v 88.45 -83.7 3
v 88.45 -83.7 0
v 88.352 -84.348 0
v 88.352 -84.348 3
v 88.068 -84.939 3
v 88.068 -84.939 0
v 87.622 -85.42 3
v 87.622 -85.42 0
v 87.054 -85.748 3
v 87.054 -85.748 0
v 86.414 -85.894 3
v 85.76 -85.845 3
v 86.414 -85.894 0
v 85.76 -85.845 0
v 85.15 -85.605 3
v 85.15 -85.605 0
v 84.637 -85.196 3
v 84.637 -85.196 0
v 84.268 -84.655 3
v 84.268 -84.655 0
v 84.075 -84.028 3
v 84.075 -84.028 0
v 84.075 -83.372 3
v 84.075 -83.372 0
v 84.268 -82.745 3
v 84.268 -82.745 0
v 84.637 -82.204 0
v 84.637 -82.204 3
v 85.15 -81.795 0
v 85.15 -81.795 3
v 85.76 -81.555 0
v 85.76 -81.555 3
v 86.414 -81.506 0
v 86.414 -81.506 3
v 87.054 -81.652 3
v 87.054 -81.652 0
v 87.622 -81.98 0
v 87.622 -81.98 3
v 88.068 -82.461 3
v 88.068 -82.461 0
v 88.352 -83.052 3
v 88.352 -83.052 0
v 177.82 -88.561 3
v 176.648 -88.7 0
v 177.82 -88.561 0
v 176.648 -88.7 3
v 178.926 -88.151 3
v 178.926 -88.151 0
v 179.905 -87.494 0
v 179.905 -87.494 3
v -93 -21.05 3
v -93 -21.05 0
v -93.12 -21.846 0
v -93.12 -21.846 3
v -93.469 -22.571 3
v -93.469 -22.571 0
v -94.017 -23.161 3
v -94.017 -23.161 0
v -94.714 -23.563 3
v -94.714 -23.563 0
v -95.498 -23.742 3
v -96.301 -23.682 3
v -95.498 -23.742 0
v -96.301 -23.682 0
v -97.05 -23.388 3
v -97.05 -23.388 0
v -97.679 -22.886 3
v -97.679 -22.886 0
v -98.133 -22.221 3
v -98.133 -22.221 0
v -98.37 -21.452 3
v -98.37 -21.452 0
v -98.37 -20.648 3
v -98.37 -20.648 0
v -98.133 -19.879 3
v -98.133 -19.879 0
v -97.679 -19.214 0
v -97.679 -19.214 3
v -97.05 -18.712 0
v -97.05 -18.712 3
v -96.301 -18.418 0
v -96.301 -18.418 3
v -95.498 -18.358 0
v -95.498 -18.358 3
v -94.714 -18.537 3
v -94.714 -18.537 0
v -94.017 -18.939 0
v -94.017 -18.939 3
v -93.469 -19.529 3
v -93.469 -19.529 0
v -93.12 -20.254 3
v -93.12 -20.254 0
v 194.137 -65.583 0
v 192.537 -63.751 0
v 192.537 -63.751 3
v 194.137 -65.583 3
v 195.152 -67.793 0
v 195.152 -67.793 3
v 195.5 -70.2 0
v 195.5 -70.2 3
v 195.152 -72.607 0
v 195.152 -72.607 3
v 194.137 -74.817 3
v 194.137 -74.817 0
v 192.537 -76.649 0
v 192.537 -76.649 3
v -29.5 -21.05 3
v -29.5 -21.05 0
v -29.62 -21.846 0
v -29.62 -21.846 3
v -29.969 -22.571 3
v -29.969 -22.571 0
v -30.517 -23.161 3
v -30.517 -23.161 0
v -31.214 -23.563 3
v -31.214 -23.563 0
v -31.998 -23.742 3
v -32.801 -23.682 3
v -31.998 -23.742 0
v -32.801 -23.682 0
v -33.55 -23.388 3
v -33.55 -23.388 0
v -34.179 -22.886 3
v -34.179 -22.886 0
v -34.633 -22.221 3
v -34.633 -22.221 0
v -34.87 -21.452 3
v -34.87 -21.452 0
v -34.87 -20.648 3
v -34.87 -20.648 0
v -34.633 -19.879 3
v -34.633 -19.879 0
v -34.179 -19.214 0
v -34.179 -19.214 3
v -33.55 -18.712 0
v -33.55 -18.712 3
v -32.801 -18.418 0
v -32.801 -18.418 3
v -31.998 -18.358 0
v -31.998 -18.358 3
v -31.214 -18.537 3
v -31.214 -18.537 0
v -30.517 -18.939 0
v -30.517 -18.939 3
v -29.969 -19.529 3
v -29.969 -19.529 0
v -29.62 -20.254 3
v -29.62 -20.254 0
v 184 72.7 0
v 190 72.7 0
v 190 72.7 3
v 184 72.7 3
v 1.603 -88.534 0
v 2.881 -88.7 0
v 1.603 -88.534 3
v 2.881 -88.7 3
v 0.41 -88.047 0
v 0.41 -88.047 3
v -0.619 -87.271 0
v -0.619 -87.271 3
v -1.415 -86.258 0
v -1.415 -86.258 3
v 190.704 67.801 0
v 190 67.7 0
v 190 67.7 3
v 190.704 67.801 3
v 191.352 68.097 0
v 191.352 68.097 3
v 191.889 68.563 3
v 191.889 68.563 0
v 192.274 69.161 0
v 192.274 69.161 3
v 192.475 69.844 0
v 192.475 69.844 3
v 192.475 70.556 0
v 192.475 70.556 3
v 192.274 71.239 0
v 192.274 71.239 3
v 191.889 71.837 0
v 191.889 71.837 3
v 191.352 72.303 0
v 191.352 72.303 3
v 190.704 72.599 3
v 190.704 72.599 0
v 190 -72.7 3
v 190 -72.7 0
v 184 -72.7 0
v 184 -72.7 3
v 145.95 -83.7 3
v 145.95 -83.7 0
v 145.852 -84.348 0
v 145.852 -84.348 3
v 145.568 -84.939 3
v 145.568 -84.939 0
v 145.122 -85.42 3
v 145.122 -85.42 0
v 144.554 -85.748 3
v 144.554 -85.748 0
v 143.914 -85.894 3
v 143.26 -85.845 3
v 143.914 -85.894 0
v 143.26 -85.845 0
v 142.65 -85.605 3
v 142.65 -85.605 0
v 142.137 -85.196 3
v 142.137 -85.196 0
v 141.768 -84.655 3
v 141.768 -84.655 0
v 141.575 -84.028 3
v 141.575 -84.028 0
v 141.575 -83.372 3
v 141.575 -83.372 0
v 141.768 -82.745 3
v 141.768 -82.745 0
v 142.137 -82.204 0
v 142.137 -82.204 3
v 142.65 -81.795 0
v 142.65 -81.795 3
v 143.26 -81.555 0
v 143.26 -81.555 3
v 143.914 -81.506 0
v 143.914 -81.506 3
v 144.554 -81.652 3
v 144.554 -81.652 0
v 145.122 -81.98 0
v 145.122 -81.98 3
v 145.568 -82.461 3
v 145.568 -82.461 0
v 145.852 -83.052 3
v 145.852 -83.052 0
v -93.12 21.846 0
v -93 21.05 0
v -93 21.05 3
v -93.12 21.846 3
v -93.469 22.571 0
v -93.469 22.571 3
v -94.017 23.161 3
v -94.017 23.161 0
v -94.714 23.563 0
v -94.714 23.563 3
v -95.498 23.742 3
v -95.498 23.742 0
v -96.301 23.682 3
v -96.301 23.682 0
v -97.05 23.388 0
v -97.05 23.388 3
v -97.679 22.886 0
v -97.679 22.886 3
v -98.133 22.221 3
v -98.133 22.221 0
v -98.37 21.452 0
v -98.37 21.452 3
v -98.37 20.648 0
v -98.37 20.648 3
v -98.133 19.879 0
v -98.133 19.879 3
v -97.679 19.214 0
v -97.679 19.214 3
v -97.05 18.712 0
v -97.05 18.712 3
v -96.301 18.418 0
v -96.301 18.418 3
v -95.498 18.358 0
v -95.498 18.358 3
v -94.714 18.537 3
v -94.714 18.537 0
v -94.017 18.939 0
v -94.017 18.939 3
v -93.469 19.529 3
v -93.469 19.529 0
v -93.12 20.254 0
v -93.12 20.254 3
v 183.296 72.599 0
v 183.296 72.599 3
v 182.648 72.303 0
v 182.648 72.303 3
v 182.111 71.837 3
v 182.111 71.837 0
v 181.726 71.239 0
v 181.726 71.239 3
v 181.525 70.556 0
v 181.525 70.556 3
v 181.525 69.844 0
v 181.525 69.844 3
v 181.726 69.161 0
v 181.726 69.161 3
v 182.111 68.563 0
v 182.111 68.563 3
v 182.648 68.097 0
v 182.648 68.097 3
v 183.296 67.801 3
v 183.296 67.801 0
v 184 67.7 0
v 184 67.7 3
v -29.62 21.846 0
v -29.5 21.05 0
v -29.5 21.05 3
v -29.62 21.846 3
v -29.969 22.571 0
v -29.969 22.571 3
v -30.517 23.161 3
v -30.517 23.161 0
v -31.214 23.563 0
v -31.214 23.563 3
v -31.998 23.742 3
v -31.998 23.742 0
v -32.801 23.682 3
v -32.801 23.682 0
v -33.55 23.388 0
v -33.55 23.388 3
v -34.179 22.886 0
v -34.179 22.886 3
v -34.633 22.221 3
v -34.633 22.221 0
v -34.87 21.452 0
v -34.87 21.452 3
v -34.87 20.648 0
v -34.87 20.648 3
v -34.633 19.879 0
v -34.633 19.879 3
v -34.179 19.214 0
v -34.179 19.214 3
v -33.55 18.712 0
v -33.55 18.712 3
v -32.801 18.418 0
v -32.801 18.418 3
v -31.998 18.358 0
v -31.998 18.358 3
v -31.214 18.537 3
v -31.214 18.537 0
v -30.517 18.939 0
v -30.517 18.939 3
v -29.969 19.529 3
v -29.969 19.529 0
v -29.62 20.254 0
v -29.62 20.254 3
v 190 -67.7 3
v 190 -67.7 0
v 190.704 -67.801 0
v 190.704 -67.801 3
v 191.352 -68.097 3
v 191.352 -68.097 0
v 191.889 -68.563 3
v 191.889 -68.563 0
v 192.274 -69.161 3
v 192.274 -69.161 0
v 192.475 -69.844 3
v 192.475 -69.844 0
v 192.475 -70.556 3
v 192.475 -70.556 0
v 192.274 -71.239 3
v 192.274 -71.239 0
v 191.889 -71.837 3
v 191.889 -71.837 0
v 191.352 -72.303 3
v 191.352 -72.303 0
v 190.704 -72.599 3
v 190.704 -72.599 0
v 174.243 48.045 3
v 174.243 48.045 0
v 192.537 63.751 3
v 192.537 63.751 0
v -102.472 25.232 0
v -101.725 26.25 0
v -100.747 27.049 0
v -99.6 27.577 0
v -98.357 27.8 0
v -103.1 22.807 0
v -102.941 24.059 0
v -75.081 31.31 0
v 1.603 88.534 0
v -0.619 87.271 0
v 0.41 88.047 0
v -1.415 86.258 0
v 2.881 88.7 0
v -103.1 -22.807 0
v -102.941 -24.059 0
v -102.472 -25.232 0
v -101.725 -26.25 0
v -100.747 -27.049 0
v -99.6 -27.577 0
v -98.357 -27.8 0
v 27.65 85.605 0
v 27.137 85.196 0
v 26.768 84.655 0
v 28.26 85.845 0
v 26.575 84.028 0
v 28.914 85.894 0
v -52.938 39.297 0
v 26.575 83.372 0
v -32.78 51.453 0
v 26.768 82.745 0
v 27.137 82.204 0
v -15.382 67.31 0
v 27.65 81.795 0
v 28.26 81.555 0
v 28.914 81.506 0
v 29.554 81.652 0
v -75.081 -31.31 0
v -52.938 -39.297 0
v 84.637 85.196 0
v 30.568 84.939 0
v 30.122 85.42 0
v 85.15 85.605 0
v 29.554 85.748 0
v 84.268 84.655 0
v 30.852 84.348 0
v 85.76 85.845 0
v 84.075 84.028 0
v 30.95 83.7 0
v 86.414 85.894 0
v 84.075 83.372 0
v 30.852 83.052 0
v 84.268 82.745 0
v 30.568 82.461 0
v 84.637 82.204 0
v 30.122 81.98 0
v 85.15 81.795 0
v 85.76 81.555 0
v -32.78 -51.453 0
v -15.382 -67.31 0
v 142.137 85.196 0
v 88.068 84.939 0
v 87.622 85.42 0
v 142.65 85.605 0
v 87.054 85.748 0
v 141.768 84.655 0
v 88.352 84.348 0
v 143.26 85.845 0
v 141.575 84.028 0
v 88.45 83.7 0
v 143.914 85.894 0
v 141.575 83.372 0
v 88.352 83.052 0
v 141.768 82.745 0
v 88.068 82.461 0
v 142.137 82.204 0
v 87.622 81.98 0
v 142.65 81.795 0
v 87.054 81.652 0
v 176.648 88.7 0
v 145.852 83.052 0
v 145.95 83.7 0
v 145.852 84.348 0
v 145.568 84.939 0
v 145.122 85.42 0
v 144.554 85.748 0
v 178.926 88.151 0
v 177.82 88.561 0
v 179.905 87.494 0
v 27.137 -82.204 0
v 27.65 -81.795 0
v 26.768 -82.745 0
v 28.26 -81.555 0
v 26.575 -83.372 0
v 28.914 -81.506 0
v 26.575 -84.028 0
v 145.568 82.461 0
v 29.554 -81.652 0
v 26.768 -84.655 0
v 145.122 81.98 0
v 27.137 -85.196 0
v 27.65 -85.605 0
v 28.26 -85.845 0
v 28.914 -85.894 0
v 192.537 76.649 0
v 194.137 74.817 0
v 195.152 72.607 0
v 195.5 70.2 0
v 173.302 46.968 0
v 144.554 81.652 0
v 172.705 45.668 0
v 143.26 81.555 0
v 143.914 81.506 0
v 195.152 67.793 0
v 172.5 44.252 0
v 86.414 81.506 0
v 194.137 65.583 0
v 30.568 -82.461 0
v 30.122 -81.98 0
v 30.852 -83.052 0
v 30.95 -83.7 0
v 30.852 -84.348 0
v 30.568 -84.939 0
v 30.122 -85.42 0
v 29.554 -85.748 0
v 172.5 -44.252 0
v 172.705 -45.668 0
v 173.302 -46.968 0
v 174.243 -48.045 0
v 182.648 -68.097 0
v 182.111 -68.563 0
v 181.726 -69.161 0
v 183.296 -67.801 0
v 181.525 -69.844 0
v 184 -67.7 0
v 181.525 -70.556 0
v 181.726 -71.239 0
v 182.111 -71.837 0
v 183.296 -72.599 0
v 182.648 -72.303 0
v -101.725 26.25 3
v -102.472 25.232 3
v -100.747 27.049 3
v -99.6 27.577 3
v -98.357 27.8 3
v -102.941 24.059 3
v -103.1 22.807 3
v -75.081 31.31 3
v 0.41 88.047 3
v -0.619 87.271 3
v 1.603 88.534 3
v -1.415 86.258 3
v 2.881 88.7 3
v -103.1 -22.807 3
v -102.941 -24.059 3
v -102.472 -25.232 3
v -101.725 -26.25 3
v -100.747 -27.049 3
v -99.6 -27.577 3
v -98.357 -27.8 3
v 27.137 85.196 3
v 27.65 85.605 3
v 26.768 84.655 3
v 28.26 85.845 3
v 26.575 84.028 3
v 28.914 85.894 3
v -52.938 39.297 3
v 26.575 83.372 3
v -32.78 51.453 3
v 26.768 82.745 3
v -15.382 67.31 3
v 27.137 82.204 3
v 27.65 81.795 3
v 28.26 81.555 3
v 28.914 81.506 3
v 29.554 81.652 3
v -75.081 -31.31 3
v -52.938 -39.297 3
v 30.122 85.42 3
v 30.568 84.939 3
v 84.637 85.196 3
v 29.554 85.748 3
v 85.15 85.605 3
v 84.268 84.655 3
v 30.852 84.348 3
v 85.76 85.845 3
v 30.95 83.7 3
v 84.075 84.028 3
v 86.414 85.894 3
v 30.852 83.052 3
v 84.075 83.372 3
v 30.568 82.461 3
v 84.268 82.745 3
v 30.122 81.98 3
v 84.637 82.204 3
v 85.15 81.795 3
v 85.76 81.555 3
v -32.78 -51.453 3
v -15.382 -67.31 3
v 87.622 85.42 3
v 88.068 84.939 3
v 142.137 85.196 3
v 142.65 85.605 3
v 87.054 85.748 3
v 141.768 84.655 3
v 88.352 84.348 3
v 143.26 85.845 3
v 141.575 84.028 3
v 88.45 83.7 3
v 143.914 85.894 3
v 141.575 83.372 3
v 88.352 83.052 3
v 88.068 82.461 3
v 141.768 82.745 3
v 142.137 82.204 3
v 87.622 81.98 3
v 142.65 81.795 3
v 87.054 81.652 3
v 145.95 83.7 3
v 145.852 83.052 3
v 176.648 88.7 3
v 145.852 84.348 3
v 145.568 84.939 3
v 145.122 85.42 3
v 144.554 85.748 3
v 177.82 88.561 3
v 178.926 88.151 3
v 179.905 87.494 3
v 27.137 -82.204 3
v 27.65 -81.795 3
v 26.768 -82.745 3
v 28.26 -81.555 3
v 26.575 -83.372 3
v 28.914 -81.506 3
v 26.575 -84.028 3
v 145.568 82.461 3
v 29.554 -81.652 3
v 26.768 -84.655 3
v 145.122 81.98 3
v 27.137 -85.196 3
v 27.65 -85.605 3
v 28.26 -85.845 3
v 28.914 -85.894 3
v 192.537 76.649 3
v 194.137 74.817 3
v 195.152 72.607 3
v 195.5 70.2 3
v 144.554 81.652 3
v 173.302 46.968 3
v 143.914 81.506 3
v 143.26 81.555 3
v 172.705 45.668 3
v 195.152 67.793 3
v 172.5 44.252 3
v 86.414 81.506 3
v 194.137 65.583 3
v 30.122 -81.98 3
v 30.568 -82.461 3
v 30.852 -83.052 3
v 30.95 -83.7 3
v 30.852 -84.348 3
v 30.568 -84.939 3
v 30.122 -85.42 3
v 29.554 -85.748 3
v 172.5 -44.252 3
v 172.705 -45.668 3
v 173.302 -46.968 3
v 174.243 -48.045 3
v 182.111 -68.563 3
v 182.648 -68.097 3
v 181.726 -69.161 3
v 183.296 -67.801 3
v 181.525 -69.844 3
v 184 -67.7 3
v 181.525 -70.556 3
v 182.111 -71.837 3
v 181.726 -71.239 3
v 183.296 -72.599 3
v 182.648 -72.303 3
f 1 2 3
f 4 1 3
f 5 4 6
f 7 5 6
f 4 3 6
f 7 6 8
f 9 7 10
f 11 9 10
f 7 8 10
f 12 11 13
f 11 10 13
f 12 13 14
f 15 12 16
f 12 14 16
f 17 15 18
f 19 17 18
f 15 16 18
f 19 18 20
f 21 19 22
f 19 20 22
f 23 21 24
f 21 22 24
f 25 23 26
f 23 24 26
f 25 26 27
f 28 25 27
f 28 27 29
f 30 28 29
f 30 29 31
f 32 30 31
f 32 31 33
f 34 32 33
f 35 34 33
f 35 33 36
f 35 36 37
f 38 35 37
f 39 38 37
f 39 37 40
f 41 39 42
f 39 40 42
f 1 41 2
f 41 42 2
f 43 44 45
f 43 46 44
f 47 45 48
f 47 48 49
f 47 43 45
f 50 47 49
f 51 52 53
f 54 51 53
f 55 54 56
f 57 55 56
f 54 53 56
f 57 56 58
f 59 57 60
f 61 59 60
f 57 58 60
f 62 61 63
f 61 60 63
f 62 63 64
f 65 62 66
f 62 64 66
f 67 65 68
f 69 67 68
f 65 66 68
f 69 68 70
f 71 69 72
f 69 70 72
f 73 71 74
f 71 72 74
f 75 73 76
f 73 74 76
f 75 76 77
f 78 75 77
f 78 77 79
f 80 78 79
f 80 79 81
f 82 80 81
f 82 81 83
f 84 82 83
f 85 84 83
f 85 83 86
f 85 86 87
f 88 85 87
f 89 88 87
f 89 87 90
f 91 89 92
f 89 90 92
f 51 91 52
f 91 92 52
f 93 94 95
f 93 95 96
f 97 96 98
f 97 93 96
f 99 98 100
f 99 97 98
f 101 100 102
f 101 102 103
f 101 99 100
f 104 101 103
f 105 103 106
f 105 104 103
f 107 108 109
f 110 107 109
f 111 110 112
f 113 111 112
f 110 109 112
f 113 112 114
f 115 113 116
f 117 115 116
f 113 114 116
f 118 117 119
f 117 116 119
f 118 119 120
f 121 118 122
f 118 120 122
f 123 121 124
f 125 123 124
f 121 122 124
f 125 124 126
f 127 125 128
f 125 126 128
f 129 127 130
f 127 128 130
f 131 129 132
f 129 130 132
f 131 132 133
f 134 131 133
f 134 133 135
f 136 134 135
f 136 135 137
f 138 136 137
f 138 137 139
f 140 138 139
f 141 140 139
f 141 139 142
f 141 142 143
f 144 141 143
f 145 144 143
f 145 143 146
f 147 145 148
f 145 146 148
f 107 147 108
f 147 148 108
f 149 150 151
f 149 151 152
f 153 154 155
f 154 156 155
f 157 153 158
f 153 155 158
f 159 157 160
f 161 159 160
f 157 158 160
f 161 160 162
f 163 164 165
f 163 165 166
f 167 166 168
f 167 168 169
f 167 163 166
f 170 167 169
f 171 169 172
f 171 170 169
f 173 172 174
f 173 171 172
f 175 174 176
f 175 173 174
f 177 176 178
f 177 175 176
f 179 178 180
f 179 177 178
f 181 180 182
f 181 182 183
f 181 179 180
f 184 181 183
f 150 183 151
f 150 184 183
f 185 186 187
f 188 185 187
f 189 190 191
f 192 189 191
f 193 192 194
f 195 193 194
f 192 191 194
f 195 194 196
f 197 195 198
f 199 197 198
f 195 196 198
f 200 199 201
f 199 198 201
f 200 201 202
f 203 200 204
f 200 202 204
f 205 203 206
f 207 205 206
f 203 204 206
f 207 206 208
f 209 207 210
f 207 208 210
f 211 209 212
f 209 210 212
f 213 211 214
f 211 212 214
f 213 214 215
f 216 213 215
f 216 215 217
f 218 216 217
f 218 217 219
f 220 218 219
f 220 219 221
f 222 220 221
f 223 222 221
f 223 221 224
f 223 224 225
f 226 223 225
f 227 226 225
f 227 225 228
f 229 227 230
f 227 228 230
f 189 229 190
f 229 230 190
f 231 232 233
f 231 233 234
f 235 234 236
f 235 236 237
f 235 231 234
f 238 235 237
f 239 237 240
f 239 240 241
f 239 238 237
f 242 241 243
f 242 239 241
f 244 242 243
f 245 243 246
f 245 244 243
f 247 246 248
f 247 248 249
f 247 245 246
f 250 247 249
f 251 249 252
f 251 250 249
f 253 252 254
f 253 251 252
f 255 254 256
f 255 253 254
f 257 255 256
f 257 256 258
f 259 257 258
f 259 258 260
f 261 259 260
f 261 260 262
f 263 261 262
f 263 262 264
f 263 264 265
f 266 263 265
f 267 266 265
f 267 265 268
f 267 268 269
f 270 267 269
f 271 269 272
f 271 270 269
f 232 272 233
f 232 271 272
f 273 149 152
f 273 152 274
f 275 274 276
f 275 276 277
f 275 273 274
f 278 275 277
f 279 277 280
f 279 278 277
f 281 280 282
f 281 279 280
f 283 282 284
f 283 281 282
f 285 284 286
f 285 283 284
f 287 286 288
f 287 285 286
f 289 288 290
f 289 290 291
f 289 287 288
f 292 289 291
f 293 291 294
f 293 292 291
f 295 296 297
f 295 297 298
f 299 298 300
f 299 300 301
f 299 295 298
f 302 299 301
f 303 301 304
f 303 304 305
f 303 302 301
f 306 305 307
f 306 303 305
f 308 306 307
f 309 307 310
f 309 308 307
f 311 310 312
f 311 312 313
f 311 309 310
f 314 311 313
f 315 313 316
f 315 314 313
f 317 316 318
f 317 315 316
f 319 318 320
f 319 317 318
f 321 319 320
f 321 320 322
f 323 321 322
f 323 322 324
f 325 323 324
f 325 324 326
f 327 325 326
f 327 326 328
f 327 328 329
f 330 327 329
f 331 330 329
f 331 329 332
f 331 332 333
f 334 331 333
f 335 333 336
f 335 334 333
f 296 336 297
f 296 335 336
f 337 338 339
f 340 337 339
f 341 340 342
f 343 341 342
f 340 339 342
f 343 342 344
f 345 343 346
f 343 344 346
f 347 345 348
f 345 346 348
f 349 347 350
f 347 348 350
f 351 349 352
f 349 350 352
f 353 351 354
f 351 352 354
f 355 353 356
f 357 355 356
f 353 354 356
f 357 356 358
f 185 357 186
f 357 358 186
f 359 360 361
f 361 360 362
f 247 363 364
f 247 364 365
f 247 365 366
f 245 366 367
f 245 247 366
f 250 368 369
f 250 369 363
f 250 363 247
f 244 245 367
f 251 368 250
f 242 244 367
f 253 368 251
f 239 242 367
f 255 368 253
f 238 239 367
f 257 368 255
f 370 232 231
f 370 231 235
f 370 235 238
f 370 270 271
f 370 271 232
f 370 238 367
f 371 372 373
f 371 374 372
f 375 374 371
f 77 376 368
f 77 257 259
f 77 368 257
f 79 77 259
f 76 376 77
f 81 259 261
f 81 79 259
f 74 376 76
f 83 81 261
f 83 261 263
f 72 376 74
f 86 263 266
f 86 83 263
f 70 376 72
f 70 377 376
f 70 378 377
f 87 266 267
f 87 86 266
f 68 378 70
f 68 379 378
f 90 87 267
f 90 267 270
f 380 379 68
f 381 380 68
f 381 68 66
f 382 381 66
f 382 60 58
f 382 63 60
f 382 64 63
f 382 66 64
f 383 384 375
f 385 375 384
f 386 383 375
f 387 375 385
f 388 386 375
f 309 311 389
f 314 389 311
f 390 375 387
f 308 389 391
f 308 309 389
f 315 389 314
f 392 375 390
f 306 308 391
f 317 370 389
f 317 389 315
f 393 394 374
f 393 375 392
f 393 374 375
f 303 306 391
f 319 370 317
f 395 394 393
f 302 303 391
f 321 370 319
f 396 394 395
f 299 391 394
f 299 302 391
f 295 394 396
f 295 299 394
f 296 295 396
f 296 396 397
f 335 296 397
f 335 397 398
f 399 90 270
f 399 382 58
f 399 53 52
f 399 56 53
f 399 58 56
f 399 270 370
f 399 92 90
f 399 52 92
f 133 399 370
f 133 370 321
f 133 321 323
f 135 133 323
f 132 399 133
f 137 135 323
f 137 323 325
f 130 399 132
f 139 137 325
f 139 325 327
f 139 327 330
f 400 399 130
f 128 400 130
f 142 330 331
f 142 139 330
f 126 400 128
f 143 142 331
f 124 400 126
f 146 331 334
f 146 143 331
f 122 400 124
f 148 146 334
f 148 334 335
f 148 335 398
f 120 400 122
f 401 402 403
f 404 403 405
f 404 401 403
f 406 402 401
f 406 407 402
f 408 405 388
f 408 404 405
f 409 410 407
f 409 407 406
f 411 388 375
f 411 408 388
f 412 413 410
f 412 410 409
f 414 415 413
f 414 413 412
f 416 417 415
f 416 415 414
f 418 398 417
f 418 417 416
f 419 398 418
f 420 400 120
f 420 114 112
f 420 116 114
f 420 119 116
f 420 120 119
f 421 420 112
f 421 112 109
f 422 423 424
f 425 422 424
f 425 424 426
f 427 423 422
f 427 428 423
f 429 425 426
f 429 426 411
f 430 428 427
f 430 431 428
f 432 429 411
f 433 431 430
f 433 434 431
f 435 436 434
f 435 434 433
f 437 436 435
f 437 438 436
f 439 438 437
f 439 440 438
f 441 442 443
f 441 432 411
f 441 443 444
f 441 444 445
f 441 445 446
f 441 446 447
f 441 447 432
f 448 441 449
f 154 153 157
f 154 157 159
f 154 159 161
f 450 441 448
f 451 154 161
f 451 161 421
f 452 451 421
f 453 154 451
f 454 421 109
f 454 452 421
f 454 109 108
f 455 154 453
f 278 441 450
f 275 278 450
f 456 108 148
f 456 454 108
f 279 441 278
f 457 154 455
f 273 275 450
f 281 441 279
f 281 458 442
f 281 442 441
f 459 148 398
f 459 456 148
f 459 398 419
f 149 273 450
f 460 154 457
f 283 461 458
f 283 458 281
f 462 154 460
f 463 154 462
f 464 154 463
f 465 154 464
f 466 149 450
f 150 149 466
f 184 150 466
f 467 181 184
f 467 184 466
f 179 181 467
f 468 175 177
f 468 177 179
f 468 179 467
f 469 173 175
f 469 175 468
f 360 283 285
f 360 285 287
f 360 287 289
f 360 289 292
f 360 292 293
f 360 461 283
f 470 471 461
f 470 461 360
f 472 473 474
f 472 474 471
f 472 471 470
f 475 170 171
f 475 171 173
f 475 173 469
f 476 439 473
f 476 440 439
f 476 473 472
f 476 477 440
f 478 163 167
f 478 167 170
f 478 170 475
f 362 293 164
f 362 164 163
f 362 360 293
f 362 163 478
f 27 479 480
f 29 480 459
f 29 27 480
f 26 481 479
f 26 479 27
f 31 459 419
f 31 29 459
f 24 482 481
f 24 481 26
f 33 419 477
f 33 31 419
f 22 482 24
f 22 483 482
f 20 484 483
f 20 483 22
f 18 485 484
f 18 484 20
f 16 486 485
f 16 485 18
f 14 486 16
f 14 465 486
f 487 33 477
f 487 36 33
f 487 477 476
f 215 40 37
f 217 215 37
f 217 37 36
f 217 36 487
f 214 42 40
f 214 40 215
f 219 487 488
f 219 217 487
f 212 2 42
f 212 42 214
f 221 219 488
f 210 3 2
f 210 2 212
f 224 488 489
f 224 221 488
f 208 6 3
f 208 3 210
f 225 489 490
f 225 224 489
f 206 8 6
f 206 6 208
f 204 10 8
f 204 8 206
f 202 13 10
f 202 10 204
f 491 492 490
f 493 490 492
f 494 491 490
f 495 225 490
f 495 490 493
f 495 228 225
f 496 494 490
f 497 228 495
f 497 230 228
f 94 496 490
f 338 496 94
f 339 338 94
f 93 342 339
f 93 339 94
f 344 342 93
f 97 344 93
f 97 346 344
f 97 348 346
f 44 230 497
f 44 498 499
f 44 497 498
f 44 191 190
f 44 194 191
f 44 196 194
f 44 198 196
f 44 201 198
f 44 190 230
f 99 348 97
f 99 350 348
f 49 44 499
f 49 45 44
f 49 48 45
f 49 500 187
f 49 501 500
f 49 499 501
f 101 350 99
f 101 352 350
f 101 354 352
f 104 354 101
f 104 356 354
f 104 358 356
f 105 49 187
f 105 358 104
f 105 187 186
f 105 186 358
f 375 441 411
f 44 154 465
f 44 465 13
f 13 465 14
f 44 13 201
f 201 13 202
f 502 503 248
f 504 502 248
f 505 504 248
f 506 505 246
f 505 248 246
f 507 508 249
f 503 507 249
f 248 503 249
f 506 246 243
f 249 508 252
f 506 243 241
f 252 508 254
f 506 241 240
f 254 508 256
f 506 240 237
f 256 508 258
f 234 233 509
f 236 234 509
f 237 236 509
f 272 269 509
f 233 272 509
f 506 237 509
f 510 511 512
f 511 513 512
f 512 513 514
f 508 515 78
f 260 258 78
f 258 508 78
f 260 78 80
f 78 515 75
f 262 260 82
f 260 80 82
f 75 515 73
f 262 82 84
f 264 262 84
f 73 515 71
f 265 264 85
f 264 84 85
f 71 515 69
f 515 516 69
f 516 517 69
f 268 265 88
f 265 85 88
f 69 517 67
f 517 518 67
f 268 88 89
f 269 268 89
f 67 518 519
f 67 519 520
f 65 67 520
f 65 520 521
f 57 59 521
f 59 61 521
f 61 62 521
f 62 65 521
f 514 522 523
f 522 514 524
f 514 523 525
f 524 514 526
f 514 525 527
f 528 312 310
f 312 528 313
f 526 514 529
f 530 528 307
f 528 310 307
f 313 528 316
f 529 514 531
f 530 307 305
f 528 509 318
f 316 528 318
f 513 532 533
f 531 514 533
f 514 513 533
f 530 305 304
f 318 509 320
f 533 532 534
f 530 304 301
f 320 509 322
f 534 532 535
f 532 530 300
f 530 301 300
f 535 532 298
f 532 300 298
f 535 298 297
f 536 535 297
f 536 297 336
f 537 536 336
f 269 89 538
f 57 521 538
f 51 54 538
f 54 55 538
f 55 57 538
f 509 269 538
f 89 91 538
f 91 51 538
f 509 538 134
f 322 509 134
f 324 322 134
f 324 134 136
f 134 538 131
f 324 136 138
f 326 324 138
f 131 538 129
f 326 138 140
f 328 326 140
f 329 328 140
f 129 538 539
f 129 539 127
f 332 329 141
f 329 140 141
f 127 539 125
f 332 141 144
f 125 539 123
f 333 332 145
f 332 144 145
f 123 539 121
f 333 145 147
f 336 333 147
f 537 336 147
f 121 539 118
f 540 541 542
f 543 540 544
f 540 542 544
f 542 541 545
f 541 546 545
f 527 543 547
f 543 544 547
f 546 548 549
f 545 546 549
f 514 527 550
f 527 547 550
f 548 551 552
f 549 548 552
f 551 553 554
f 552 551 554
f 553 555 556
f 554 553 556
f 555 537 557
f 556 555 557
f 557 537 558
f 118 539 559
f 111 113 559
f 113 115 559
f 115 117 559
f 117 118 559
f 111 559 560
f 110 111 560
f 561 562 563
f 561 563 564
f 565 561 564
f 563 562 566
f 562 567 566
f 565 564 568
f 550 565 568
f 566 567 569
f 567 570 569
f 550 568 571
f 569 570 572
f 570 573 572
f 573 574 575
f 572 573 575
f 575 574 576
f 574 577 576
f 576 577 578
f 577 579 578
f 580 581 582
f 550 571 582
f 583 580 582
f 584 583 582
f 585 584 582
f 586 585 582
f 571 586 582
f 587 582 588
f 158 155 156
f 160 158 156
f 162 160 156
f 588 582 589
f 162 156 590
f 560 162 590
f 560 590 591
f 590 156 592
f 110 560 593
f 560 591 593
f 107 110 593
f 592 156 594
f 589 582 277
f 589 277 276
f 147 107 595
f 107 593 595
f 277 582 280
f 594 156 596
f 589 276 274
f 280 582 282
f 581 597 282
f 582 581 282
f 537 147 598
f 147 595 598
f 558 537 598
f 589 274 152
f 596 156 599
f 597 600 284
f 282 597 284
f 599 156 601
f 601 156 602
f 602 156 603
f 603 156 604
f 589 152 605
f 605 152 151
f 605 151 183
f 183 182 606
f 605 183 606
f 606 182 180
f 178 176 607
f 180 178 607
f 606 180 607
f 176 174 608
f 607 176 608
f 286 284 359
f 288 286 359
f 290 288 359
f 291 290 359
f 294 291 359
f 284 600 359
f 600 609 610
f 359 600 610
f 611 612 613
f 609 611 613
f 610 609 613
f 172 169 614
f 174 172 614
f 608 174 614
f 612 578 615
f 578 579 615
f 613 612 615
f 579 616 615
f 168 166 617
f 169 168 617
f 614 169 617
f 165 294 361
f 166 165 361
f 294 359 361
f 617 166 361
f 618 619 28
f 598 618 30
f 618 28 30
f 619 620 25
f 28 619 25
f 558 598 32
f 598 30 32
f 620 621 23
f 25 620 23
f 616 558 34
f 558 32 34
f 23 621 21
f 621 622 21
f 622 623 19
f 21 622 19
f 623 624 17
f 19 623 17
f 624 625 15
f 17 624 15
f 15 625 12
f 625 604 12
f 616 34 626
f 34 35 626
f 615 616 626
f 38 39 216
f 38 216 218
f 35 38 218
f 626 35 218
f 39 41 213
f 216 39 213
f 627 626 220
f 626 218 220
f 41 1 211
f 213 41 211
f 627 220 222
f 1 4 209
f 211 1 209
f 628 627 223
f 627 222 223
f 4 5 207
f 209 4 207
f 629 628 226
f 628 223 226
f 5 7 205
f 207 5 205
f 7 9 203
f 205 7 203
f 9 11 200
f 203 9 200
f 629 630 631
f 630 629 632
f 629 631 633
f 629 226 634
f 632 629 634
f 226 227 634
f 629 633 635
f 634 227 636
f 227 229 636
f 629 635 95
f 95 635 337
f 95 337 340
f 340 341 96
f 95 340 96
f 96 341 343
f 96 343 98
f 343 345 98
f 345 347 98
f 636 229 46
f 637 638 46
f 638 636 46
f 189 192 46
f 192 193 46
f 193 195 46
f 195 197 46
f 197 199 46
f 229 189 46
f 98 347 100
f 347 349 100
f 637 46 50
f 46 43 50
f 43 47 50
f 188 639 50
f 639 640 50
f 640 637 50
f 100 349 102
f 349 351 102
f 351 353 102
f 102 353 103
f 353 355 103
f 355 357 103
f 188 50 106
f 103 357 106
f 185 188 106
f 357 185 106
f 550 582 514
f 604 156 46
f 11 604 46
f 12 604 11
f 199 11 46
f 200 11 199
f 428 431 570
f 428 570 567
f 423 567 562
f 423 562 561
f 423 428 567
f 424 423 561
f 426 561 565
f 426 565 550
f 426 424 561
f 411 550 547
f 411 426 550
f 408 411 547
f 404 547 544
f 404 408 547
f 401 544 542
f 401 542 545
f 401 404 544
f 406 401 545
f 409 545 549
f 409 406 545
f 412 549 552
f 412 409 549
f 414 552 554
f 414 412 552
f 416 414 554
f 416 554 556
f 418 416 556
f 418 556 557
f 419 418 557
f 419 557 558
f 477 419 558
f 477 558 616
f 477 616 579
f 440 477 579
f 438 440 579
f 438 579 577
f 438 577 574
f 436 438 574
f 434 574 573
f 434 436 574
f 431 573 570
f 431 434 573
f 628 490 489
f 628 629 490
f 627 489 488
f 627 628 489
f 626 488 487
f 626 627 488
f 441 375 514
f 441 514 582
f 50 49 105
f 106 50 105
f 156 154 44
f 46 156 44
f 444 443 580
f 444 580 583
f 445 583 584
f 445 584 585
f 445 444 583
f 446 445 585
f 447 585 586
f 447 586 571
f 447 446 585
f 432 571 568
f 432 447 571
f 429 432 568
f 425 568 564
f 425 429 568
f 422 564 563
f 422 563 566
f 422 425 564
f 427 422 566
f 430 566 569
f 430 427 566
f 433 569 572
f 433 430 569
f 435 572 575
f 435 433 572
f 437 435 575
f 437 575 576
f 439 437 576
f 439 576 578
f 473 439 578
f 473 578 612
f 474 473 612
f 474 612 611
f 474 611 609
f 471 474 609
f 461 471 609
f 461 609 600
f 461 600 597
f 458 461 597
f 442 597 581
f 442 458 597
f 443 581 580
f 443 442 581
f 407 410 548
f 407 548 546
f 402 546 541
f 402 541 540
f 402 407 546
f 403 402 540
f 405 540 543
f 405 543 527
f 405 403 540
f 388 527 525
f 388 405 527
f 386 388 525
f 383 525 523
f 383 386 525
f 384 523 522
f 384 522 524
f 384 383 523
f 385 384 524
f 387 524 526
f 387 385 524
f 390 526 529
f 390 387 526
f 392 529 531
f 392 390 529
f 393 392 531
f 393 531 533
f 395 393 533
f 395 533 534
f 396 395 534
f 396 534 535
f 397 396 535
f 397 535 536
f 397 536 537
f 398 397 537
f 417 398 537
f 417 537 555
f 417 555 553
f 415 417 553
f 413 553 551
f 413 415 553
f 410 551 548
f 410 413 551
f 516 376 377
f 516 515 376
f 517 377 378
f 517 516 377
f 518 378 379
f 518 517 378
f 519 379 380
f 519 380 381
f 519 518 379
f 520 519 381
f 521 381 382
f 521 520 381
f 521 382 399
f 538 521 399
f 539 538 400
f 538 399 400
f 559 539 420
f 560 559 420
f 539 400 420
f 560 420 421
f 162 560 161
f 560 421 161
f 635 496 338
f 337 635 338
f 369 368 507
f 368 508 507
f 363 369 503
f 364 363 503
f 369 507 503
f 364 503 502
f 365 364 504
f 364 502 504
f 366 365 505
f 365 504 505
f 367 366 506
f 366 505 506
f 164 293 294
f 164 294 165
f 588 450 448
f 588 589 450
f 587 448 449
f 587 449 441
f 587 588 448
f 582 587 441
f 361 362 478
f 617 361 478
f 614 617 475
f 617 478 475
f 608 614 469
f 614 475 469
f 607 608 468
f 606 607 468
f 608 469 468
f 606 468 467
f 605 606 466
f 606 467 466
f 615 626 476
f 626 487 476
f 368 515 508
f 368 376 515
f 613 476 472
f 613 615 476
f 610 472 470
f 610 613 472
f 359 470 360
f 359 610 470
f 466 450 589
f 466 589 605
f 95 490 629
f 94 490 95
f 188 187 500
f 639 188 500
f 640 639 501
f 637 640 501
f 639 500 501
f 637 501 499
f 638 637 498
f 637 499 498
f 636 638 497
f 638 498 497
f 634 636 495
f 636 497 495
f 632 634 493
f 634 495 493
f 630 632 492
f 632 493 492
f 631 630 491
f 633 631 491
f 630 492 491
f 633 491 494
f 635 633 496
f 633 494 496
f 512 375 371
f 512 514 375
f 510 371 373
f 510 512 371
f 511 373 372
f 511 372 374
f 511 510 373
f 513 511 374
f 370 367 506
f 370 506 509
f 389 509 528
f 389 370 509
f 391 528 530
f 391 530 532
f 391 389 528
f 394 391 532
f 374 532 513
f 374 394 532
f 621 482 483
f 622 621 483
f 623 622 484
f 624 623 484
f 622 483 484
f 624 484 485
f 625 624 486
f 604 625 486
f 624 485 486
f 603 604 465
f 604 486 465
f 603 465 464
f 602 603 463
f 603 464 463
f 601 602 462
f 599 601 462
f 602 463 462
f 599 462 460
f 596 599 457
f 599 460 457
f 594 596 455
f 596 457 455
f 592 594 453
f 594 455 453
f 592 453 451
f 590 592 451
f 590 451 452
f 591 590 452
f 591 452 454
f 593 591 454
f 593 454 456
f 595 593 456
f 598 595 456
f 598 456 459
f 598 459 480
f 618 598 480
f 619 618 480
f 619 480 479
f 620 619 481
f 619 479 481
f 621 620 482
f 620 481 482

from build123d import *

# Parameters (mm, degrees)
SKETCH_R   = 2.7
SKETCH_R_2 = 2.2
PAD_DEPTH  = 3
FILLET_R   = 5


with BuildPart() as part:
    # Sketch → Pad (new body)
    with BuildSketch(Plane.XY):
        with BuildLine():
            Line((-103.1, 27.65), (-103.1, 0))
            Line((-103.1, 0), (172.5, 0))
            Line((172.5, 46.548967), (172.5, 0))
            Line((172.5, 46.548967), (192.536791, 63.750663))
            ThreePointArc((192.536791, 63.750663), (195.5, 70.199983), (192.536817, 76.649314))
            Line((178.5, 88.7), (192.536817, 76.649314))
            Line((0, 88.7), (178.5, 88.7))
            ThreePointArc((-103.1, 27.65), (-43.385052, 44.386201), (0, 88.7))
        make_face()
        with Locations((-95.7, 21.05)):
            Circle(SKETCH_R, mode=Mode.SUBTRACT)
        with Locations((-32.2, 21.05)):
            Circle(SKETCH_R, mode=Mode.SUBTRACT)
        with Locations((86.25, 83.7)):
            Circle(SKETCH_R_2, mode=Mode.SUBTRACT)
        with Locations((28.75, 83.7)):
            Circle(SKETCH_R_2, mode=Mode.SUBTRACT)
        with Locations((143.75, 83.7)):
            Circle(SKETCH_R_2, mode=Mode.SUBTRACT)
        with BuildLine():
            ThreePointArc((184, 72.7), (181.5, 70.2), (184, 67.7))
            Line((184, 67.7), (190, 67.7))
            ThreePointArc((190, 67.7), (192.5, 70.2), (190, 72.7))
            Line((190, 72.7), (184, 72.7))
        make_face(mode=Mode.SUBTRACT)
    pad = extrude(amount=PAD_DEPTH)

    # Mirrored: Pad across XZ
    add(pad.mirror(Plane.XZ))

    # Fillet
    fillet_edges = [part.edges().sort_by_distance(p)[0] for p in [
        (178.5, -88.7, 1.5),
        (0, -88.7, 1.5),
        (-103.1, -27.65, 1.5),
        (192.536817, 76.649314, 1.5),
        (178.5, 88.7, 1.5),
        (0, 88.7, 1.5),
        (-103.1, 27.65, 1.5),
        (172.5, 46.548967, 1.5),
        (172.5, -46.548967, 1.5),
    ]]
    fillet(fillet_edges, radius=FILLET_R)


solid = part.part
